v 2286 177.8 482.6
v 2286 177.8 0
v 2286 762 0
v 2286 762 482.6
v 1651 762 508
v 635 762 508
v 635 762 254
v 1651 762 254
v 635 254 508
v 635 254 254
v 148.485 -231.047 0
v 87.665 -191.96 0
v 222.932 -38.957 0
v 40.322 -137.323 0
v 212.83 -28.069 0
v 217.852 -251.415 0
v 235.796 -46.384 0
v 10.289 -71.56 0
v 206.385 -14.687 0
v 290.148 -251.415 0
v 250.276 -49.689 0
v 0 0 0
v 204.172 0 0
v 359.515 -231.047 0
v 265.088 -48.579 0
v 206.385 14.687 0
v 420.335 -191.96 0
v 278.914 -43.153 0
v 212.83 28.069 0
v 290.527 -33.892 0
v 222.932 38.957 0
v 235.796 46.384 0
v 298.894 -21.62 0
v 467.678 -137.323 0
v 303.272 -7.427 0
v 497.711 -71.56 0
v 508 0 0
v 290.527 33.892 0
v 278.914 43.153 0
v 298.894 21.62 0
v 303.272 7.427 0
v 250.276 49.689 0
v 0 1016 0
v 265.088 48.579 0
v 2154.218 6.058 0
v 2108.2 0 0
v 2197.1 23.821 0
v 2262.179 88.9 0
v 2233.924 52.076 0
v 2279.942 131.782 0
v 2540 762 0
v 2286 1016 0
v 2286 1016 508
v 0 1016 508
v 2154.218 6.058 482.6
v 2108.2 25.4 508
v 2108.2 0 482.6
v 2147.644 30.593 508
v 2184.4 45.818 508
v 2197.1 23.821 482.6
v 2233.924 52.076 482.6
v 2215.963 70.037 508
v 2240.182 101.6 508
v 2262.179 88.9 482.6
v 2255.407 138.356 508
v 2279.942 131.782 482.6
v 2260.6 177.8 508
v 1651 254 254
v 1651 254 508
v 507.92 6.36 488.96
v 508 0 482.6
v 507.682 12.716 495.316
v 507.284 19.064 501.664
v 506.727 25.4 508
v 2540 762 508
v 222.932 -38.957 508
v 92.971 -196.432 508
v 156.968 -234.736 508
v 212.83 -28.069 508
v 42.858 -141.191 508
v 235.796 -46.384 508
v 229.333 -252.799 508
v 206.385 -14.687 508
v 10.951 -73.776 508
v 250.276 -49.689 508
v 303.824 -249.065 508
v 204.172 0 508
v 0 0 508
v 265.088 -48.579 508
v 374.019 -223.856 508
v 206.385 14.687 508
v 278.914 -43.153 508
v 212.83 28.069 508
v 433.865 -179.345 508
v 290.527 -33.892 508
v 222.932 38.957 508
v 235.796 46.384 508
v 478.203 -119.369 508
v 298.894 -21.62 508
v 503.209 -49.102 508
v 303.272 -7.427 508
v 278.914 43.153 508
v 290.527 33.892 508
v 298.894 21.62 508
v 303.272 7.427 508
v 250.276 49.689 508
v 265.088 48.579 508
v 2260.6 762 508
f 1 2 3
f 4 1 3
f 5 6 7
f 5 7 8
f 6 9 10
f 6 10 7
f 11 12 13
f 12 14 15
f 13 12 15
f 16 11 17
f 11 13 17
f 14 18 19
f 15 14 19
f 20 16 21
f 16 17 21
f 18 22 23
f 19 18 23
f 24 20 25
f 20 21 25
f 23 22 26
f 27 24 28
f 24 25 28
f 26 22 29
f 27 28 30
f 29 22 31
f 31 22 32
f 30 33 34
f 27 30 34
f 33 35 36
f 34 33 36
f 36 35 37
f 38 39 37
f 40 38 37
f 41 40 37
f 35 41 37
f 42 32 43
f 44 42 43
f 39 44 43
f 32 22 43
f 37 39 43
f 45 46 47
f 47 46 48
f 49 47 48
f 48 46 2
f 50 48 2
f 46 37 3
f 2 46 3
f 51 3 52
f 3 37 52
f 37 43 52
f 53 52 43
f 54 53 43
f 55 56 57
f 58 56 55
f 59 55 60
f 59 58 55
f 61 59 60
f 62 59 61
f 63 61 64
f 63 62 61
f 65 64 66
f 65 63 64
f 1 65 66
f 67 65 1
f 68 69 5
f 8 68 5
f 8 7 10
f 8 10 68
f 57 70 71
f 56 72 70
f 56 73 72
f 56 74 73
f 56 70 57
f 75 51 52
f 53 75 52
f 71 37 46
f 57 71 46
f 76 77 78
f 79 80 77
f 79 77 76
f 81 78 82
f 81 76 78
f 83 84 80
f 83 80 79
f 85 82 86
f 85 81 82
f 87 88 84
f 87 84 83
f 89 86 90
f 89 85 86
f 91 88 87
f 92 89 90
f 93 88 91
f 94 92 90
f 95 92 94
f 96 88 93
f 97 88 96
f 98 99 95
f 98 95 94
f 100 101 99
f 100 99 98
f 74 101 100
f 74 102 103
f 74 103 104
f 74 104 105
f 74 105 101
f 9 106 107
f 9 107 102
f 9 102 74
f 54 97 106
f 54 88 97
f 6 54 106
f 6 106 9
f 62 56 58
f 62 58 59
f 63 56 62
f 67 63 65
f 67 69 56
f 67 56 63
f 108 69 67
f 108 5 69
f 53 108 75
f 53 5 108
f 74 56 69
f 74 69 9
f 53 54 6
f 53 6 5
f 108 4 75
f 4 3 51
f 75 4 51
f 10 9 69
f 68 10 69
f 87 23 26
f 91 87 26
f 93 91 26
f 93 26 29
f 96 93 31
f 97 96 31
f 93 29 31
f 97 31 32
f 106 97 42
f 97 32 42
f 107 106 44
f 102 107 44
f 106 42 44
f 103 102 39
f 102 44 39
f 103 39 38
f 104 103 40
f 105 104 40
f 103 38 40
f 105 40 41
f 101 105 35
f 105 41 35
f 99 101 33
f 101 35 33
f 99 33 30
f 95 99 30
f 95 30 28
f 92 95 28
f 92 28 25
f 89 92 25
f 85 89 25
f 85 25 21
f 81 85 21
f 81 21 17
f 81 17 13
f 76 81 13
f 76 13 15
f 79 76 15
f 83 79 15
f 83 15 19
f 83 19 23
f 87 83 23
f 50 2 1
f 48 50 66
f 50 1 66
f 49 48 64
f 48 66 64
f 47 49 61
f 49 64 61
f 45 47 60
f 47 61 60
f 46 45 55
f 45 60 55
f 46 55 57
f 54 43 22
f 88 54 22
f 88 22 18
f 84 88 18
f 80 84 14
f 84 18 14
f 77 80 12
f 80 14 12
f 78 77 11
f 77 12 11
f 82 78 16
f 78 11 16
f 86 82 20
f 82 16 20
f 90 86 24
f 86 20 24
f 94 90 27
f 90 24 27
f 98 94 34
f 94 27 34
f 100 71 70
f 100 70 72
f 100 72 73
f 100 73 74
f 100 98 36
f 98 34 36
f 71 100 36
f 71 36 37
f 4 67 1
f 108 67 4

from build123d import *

# Parameters (mm, degrees)
BOSS_EXTRUDE1_DEPTH       = 508
TAP_DRILL_FOR_4_12_TAP1_D = 99.6569
SKETCH8_W                 = 1016
SKETCH8_H                 = 508
CUT_EXTRUDE1_DEPTH        = 254
FILLET1_R                 = 177.8
CHAMFER1_SIZE             = 25.4


with BuildPart() as part:
    # Sketch3 → Boss-Extrude1 (new body)
    with BuildSketch(Plane.XY):
        with BuildLine():
            Line((2286, 762), (2540, 762))
            Line((2540, 762), (2286, 1016))
            Line((2286, 1016), (0, 1016))
            Line((0, 1016), (0, 0))
            ThreePointArc((0, 0), (254, -254), (508, 0))
            Line((508, 0), (2286, 0))
            Line((2286, 0), (2286, 762))
        make_face()
    extrude(amount=BOSS_EXTRUDE1_DEPTH)

    # Tap Drill for 4-12 Tap1 (through all)
    with Locations(Plane(origin=(254, 0, 508), x_dir=(1, 0, 0), z_dir=(0, 0, 1))):
        with Locations((0, 0)):
            Hole(TAP_DRILL_FOR_4_12_TAP1_D / 2)

    # Sketch8 → Cut-Extrude1 (cut)
    with BuildSketch(Plane.XY.offset(508)):
        with Locations((1143, 508)):
            Rectangle(SKETCH8_W, SKETCH8_H)
    extrude(amount=-CUT_EXTRUDE1_DEPTH, mode=Mode.SUBTRACT)

    # Fillet1
    fillet1_edges = [part.edges().sort_by_distance(p)[0] for p in [
        (2286, 0, 254),
    ]]
    fillet(fillet1_edges, radius=FILLET1_R)

    # Chamfer1
    chamfer1_edges = [part.edges().sort_by_distance(p)[0] for p in [
        (2286, 469.9, 508),
        (2233.923585695, 52.076414305, 508),
        (1308.1, 0, 508),
    ]]
    chamfer(chamfer1_edges, length=CHAMFER1_SIZE)


solid = part.part
